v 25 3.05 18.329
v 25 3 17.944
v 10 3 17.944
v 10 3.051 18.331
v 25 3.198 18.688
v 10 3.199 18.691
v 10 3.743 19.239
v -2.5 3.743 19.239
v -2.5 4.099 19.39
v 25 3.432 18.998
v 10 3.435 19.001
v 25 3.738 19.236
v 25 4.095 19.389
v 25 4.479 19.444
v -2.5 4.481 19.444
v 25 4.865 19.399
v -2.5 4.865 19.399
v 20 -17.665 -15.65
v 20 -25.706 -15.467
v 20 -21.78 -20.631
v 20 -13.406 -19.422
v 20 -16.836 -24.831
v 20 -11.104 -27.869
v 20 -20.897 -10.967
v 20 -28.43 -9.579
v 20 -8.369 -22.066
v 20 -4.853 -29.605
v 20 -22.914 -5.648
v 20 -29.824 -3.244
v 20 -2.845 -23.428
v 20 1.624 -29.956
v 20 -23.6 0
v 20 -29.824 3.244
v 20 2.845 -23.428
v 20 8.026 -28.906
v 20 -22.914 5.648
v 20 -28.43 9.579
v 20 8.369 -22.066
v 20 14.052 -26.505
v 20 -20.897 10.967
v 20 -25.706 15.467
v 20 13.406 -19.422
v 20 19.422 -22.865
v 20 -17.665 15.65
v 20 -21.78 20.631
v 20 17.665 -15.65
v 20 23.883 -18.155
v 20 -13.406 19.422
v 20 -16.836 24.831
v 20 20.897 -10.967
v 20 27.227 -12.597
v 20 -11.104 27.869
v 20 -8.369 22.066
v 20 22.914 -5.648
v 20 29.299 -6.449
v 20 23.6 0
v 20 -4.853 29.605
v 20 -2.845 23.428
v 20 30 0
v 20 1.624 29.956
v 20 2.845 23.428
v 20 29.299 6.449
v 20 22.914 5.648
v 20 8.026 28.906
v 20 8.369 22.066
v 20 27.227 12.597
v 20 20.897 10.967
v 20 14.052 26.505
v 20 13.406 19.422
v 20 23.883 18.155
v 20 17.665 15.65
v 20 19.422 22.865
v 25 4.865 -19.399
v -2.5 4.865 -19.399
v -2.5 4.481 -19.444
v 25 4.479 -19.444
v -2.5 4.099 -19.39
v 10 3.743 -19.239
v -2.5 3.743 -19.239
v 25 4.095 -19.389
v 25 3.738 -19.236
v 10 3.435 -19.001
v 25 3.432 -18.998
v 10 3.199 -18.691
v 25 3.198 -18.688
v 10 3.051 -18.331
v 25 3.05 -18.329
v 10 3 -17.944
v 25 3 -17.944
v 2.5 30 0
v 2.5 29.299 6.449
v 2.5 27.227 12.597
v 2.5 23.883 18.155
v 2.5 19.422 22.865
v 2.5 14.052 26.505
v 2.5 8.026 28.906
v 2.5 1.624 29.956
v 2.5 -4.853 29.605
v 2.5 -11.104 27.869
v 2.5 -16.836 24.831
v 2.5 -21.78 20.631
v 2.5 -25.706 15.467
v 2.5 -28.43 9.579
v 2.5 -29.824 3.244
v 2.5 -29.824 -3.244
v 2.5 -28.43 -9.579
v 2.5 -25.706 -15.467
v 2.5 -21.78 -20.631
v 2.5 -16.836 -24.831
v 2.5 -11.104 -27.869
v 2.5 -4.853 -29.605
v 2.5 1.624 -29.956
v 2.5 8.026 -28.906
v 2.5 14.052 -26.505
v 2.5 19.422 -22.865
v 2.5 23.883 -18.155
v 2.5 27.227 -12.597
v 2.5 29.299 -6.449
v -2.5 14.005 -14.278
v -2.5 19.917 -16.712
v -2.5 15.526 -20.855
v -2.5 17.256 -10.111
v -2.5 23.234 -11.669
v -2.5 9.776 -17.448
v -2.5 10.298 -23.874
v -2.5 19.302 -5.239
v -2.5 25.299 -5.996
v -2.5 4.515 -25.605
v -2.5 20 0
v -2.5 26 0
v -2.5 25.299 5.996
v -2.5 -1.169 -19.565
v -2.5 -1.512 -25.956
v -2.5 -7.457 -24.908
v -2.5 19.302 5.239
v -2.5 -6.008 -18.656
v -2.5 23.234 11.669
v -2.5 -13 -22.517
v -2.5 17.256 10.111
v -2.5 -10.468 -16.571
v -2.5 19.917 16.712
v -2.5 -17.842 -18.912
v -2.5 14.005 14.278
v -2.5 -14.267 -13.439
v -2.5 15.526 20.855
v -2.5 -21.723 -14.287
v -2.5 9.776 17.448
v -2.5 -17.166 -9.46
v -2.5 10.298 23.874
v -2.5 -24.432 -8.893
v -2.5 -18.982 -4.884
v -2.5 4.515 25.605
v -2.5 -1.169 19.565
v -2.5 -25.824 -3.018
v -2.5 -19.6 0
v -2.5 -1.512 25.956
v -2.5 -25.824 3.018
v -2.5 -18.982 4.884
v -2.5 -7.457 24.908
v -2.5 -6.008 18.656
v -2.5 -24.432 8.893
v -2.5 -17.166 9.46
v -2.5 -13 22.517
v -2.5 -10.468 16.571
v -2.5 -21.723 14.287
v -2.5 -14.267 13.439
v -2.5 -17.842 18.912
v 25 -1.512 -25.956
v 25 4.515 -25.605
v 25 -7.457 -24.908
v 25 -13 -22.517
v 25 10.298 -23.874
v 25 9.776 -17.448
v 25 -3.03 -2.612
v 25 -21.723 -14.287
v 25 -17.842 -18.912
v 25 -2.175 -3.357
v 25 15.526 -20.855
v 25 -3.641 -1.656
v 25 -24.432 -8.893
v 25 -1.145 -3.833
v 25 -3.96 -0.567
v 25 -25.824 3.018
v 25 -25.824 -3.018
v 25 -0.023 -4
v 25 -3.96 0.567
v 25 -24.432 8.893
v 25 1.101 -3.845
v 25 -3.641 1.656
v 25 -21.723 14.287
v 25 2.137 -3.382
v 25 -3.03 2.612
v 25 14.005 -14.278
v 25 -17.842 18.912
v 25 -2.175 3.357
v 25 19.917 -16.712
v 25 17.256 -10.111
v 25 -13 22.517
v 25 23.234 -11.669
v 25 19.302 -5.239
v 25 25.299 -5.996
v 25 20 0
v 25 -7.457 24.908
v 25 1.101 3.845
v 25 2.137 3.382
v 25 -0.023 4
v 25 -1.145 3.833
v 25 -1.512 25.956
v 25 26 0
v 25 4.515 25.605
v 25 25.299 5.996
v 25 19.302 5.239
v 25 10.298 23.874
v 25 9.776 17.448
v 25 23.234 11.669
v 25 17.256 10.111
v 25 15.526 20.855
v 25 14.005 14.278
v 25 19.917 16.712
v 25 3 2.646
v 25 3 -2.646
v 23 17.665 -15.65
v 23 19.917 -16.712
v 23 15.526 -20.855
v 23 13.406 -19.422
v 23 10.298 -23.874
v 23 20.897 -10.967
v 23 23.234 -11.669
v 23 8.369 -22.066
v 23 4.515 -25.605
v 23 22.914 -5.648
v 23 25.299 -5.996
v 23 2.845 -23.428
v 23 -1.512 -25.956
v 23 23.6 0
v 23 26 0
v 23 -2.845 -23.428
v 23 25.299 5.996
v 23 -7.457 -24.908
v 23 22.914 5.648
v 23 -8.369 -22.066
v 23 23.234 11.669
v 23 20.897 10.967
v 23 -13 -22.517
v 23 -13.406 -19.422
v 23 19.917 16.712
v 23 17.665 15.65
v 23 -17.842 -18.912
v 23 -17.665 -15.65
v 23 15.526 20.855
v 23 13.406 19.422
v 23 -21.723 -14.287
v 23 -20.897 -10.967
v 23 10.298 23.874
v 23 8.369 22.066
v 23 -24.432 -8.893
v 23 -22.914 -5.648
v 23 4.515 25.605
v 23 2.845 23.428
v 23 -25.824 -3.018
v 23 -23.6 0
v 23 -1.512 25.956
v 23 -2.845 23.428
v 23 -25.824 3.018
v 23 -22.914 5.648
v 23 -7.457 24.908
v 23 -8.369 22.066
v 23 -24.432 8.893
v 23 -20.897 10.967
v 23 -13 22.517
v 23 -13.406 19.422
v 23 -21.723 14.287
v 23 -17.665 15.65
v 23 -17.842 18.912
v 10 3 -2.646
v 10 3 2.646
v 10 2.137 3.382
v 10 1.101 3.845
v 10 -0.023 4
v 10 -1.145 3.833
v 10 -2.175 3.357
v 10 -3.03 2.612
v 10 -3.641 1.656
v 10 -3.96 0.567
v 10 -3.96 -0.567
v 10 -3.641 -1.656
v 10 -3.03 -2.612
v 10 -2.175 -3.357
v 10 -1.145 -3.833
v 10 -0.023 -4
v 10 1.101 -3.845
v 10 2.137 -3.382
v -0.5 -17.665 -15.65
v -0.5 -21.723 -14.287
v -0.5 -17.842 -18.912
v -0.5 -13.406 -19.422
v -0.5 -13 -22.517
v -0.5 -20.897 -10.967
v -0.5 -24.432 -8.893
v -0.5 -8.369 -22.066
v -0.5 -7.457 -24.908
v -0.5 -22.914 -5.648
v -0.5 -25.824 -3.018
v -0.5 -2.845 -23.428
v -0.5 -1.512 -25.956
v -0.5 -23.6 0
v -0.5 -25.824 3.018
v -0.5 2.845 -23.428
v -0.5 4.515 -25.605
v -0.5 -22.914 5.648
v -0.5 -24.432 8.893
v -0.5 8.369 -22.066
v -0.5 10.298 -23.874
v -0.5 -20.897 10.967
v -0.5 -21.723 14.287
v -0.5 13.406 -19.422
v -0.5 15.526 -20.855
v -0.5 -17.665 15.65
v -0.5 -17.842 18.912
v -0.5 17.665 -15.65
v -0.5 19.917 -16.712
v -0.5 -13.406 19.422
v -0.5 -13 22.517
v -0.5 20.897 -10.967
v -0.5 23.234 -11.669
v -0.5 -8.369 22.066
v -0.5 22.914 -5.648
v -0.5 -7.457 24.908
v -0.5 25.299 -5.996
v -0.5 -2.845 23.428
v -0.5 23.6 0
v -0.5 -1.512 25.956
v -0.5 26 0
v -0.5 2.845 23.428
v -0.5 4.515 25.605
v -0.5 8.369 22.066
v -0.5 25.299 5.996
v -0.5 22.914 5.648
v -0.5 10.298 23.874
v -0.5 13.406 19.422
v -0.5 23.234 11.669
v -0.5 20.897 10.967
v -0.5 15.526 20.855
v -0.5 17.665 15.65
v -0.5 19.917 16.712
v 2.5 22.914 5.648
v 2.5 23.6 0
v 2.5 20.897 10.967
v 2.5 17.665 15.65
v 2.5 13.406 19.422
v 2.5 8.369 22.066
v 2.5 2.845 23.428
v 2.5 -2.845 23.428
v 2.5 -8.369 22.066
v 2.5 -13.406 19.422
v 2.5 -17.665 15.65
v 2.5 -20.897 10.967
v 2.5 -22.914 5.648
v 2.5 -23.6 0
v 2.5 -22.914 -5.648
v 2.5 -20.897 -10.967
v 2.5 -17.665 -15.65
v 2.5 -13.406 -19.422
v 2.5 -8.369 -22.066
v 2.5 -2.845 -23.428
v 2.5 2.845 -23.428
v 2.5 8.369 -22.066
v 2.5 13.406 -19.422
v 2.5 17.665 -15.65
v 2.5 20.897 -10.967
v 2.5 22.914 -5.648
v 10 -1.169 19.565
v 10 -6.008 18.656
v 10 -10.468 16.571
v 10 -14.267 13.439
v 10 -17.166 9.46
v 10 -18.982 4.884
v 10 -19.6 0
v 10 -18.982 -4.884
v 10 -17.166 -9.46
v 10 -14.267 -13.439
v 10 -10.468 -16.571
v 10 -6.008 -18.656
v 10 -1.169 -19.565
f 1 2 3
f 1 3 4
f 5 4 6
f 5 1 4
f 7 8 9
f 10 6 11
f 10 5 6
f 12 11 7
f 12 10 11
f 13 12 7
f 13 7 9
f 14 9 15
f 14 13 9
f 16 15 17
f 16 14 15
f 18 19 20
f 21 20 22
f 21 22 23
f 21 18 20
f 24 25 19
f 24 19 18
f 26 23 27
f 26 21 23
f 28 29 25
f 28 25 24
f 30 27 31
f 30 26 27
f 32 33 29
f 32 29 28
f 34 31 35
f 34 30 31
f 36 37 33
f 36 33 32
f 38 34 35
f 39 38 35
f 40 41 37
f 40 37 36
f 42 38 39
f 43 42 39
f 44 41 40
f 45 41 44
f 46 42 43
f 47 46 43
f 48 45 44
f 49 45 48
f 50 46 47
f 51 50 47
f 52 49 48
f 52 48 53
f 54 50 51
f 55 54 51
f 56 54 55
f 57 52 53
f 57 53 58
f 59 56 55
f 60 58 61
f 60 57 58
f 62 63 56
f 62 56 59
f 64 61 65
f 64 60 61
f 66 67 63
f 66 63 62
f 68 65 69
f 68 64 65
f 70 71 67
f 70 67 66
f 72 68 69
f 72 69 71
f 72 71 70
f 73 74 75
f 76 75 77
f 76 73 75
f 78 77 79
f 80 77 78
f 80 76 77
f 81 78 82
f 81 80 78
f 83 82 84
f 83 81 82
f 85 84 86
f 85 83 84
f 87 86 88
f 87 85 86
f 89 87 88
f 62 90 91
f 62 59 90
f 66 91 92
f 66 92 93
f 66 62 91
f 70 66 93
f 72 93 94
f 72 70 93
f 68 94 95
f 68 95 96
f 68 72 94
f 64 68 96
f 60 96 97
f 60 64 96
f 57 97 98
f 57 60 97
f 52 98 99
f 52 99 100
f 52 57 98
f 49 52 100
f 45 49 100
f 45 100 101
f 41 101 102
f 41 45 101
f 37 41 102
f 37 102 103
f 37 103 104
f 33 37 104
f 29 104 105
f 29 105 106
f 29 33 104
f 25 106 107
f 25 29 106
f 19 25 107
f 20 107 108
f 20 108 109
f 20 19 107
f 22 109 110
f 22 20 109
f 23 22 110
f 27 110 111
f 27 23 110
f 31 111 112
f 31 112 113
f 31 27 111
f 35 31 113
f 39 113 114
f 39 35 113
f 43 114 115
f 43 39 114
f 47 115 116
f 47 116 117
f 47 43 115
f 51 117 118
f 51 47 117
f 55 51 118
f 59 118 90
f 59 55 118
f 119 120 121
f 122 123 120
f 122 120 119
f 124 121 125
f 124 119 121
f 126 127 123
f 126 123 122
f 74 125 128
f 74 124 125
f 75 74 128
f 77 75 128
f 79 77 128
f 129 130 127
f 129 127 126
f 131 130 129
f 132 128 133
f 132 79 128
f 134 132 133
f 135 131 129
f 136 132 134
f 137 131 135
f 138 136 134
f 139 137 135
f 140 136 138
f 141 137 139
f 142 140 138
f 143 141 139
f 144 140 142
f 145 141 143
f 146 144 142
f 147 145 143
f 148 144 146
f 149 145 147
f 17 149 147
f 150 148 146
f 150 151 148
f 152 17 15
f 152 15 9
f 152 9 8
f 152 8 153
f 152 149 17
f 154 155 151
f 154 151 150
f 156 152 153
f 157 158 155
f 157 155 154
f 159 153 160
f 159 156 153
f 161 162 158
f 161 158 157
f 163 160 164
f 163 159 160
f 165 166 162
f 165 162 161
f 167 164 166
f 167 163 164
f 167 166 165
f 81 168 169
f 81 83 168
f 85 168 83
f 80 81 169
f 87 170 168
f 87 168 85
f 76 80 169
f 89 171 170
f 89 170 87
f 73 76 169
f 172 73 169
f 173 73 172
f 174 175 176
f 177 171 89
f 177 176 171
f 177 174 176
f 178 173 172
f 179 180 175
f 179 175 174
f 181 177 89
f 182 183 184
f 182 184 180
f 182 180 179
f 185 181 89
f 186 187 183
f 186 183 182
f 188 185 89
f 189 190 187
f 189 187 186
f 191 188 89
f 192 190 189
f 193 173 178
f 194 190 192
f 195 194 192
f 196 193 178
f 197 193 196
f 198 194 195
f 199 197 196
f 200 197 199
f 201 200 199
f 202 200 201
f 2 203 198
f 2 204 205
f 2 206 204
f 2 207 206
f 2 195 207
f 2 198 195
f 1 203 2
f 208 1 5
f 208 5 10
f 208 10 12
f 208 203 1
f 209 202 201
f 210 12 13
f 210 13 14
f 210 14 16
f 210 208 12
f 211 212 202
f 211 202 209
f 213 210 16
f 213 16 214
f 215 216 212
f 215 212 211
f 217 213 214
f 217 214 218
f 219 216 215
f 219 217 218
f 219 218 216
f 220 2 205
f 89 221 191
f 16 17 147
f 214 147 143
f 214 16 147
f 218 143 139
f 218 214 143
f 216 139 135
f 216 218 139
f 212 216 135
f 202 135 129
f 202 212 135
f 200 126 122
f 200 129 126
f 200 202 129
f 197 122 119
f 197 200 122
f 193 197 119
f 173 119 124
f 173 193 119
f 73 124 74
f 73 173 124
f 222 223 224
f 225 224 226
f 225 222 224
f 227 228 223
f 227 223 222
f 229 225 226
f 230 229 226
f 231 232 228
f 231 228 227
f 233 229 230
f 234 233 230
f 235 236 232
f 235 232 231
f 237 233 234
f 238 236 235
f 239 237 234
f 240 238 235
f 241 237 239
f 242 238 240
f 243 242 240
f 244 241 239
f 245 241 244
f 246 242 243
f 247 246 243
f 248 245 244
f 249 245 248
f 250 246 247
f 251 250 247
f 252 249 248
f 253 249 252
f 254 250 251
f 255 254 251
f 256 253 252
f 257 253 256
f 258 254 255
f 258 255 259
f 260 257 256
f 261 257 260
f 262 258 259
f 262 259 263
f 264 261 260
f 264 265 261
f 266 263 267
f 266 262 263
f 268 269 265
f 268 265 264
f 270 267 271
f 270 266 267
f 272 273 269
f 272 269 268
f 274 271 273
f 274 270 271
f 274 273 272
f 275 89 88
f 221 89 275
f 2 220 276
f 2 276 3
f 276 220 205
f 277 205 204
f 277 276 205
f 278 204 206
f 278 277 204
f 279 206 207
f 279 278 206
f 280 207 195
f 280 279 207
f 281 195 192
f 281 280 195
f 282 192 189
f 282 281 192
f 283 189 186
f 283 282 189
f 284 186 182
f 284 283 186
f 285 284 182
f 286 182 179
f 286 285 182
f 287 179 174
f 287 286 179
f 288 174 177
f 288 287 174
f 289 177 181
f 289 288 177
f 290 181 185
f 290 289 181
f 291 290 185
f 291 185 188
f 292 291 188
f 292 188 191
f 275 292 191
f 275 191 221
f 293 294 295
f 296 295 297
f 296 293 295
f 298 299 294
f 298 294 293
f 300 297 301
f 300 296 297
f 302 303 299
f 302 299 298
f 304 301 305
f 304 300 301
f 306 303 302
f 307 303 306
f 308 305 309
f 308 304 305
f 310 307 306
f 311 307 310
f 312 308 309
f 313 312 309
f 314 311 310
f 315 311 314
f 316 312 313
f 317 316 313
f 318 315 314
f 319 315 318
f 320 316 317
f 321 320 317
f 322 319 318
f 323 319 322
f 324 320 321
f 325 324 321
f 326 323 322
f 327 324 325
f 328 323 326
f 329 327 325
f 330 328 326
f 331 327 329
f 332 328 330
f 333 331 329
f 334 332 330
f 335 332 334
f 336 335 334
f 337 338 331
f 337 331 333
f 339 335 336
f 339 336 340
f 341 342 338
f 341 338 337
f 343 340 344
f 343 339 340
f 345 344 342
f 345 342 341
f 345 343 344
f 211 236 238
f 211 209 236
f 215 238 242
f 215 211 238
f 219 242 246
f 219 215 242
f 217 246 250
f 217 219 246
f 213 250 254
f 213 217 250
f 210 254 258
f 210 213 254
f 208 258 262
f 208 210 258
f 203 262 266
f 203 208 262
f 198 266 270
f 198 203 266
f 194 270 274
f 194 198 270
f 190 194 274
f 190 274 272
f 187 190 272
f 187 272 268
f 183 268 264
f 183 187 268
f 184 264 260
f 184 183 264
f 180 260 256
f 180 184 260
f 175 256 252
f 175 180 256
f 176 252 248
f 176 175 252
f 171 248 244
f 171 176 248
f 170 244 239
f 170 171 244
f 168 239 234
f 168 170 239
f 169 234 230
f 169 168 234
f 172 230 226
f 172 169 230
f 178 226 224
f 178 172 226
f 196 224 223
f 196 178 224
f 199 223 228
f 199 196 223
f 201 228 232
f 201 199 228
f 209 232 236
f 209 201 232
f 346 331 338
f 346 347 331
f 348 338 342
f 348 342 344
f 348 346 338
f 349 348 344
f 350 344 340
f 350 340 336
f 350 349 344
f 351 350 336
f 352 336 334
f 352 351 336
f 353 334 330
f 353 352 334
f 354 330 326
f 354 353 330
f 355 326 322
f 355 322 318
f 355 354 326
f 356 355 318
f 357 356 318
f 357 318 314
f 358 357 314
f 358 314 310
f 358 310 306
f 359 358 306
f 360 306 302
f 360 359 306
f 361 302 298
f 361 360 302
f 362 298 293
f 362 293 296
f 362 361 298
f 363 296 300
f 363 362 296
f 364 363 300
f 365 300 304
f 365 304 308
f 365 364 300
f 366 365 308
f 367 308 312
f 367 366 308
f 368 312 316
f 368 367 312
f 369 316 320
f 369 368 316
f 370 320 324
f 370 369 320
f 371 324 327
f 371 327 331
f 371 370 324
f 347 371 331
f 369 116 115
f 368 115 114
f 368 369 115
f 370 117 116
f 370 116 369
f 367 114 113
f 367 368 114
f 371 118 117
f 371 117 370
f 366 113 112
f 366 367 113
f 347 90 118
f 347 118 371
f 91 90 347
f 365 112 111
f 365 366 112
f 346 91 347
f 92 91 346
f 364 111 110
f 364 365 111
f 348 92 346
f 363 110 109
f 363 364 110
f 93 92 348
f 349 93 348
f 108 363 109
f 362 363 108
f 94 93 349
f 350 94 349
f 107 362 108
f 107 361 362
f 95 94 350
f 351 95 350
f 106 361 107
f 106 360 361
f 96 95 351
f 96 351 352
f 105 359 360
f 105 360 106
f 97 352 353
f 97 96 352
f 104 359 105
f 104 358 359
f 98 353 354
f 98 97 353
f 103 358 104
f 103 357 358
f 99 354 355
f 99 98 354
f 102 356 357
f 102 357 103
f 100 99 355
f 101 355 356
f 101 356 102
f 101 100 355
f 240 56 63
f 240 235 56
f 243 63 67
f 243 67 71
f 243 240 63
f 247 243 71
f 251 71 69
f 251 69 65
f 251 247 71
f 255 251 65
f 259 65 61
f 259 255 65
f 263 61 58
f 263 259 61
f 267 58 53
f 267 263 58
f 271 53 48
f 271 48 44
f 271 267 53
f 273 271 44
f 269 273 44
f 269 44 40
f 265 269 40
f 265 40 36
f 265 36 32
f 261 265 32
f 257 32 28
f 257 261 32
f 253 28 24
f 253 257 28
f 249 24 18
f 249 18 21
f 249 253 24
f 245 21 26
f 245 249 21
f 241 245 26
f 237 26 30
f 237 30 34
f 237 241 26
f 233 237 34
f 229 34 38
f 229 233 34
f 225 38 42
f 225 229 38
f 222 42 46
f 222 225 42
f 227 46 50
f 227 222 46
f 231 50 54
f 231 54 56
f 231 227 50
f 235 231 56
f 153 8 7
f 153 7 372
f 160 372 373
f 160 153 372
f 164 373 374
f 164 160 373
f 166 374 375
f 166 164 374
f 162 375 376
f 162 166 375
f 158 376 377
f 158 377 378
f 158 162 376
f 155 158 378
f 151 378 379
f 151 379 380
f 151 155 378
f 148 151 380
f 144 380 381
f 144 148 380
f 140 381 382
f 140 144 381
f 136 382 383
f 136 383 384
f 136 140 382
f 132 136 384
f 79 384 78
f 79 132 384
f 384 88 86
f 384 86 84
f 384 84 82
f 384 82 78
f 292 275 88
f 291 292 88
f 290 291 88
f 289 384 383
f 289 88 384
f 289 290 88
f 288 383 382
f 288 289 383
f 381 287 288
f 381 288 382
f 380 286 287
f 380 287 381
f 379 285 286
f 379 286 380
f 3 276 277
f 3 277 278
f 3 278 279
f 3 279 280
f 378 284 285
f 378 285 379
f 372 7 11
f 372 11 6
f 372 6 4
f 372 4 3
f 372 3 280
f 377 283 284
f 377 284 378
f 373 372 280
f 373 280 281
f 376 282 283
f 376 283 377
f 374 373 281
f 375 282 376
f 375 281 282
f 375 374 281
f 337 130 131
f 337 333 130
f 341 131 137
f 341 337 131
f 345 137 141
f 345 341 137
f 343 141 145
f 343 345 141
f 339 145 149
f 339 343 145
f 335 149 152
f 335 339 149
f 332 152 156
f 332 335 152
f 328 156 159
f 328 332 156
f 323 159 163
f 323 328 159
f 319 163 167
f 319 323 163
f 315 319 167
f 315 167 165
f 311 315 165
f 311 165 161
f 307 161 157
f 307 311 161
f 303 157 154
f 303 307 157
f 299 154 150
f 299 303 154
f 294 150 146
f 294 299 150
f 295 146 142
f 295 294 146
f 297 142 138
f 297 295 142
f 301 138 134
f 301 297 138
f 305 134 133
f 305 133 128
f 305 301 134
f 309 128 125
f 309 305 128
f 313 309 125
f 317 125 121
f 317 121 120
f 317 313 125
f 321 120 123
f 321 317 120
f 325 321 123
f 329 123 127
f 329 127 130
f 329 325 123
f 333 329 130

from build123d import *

# Parameters (mm, degrees)
EXTRUSION1_DEPTH = 28.5


with BuildPart() as part:
    # Esquisse1 → Révolution1 (revolve)
    with BuildSketch(Plane.XY):
        Polygon((-2.5, 19.6), (-2.5, 26), (-0.5, 26), (-0.5, 23.6), (2.5, 23.6), (2.5, 30), (20, 30), (20, 23.6), (23, 23.6), (23, 26), (25, 26), (25, 4), (10, 4), (10, 19.6), align=None)
    revolve(axis=Axis((10, 0, 0), (1, 0, 0)))

    # Esquisse2 → Extrusion1 (cut, through all)
    with BuildSketch(Plane(origin=(25, 0, 0), x_dir=(0, 0, -1), z_dir=(1, 0, 0))):
        with BuildLine():
            Line((17.944358445, 3), (-17.944358445, 3))
            ThreePointArc((-17.944358445, 3), (-19.127003214, 3.577312972), (-19.399306427, 4.864864865))
            ThreePointArc((-19.399306427, 4.864864865), (0, 20), (19.399306427, 4.864864865))
            ThreePointArc((19.399306427, 4.864864865), (19.127003214, 3.577312972), (17.944358445, 3))
        make_face()
    extrude(amount=-EXTRUSION1_DEPTH, mode=Mode.SUBTRACT)


solid = part.part
